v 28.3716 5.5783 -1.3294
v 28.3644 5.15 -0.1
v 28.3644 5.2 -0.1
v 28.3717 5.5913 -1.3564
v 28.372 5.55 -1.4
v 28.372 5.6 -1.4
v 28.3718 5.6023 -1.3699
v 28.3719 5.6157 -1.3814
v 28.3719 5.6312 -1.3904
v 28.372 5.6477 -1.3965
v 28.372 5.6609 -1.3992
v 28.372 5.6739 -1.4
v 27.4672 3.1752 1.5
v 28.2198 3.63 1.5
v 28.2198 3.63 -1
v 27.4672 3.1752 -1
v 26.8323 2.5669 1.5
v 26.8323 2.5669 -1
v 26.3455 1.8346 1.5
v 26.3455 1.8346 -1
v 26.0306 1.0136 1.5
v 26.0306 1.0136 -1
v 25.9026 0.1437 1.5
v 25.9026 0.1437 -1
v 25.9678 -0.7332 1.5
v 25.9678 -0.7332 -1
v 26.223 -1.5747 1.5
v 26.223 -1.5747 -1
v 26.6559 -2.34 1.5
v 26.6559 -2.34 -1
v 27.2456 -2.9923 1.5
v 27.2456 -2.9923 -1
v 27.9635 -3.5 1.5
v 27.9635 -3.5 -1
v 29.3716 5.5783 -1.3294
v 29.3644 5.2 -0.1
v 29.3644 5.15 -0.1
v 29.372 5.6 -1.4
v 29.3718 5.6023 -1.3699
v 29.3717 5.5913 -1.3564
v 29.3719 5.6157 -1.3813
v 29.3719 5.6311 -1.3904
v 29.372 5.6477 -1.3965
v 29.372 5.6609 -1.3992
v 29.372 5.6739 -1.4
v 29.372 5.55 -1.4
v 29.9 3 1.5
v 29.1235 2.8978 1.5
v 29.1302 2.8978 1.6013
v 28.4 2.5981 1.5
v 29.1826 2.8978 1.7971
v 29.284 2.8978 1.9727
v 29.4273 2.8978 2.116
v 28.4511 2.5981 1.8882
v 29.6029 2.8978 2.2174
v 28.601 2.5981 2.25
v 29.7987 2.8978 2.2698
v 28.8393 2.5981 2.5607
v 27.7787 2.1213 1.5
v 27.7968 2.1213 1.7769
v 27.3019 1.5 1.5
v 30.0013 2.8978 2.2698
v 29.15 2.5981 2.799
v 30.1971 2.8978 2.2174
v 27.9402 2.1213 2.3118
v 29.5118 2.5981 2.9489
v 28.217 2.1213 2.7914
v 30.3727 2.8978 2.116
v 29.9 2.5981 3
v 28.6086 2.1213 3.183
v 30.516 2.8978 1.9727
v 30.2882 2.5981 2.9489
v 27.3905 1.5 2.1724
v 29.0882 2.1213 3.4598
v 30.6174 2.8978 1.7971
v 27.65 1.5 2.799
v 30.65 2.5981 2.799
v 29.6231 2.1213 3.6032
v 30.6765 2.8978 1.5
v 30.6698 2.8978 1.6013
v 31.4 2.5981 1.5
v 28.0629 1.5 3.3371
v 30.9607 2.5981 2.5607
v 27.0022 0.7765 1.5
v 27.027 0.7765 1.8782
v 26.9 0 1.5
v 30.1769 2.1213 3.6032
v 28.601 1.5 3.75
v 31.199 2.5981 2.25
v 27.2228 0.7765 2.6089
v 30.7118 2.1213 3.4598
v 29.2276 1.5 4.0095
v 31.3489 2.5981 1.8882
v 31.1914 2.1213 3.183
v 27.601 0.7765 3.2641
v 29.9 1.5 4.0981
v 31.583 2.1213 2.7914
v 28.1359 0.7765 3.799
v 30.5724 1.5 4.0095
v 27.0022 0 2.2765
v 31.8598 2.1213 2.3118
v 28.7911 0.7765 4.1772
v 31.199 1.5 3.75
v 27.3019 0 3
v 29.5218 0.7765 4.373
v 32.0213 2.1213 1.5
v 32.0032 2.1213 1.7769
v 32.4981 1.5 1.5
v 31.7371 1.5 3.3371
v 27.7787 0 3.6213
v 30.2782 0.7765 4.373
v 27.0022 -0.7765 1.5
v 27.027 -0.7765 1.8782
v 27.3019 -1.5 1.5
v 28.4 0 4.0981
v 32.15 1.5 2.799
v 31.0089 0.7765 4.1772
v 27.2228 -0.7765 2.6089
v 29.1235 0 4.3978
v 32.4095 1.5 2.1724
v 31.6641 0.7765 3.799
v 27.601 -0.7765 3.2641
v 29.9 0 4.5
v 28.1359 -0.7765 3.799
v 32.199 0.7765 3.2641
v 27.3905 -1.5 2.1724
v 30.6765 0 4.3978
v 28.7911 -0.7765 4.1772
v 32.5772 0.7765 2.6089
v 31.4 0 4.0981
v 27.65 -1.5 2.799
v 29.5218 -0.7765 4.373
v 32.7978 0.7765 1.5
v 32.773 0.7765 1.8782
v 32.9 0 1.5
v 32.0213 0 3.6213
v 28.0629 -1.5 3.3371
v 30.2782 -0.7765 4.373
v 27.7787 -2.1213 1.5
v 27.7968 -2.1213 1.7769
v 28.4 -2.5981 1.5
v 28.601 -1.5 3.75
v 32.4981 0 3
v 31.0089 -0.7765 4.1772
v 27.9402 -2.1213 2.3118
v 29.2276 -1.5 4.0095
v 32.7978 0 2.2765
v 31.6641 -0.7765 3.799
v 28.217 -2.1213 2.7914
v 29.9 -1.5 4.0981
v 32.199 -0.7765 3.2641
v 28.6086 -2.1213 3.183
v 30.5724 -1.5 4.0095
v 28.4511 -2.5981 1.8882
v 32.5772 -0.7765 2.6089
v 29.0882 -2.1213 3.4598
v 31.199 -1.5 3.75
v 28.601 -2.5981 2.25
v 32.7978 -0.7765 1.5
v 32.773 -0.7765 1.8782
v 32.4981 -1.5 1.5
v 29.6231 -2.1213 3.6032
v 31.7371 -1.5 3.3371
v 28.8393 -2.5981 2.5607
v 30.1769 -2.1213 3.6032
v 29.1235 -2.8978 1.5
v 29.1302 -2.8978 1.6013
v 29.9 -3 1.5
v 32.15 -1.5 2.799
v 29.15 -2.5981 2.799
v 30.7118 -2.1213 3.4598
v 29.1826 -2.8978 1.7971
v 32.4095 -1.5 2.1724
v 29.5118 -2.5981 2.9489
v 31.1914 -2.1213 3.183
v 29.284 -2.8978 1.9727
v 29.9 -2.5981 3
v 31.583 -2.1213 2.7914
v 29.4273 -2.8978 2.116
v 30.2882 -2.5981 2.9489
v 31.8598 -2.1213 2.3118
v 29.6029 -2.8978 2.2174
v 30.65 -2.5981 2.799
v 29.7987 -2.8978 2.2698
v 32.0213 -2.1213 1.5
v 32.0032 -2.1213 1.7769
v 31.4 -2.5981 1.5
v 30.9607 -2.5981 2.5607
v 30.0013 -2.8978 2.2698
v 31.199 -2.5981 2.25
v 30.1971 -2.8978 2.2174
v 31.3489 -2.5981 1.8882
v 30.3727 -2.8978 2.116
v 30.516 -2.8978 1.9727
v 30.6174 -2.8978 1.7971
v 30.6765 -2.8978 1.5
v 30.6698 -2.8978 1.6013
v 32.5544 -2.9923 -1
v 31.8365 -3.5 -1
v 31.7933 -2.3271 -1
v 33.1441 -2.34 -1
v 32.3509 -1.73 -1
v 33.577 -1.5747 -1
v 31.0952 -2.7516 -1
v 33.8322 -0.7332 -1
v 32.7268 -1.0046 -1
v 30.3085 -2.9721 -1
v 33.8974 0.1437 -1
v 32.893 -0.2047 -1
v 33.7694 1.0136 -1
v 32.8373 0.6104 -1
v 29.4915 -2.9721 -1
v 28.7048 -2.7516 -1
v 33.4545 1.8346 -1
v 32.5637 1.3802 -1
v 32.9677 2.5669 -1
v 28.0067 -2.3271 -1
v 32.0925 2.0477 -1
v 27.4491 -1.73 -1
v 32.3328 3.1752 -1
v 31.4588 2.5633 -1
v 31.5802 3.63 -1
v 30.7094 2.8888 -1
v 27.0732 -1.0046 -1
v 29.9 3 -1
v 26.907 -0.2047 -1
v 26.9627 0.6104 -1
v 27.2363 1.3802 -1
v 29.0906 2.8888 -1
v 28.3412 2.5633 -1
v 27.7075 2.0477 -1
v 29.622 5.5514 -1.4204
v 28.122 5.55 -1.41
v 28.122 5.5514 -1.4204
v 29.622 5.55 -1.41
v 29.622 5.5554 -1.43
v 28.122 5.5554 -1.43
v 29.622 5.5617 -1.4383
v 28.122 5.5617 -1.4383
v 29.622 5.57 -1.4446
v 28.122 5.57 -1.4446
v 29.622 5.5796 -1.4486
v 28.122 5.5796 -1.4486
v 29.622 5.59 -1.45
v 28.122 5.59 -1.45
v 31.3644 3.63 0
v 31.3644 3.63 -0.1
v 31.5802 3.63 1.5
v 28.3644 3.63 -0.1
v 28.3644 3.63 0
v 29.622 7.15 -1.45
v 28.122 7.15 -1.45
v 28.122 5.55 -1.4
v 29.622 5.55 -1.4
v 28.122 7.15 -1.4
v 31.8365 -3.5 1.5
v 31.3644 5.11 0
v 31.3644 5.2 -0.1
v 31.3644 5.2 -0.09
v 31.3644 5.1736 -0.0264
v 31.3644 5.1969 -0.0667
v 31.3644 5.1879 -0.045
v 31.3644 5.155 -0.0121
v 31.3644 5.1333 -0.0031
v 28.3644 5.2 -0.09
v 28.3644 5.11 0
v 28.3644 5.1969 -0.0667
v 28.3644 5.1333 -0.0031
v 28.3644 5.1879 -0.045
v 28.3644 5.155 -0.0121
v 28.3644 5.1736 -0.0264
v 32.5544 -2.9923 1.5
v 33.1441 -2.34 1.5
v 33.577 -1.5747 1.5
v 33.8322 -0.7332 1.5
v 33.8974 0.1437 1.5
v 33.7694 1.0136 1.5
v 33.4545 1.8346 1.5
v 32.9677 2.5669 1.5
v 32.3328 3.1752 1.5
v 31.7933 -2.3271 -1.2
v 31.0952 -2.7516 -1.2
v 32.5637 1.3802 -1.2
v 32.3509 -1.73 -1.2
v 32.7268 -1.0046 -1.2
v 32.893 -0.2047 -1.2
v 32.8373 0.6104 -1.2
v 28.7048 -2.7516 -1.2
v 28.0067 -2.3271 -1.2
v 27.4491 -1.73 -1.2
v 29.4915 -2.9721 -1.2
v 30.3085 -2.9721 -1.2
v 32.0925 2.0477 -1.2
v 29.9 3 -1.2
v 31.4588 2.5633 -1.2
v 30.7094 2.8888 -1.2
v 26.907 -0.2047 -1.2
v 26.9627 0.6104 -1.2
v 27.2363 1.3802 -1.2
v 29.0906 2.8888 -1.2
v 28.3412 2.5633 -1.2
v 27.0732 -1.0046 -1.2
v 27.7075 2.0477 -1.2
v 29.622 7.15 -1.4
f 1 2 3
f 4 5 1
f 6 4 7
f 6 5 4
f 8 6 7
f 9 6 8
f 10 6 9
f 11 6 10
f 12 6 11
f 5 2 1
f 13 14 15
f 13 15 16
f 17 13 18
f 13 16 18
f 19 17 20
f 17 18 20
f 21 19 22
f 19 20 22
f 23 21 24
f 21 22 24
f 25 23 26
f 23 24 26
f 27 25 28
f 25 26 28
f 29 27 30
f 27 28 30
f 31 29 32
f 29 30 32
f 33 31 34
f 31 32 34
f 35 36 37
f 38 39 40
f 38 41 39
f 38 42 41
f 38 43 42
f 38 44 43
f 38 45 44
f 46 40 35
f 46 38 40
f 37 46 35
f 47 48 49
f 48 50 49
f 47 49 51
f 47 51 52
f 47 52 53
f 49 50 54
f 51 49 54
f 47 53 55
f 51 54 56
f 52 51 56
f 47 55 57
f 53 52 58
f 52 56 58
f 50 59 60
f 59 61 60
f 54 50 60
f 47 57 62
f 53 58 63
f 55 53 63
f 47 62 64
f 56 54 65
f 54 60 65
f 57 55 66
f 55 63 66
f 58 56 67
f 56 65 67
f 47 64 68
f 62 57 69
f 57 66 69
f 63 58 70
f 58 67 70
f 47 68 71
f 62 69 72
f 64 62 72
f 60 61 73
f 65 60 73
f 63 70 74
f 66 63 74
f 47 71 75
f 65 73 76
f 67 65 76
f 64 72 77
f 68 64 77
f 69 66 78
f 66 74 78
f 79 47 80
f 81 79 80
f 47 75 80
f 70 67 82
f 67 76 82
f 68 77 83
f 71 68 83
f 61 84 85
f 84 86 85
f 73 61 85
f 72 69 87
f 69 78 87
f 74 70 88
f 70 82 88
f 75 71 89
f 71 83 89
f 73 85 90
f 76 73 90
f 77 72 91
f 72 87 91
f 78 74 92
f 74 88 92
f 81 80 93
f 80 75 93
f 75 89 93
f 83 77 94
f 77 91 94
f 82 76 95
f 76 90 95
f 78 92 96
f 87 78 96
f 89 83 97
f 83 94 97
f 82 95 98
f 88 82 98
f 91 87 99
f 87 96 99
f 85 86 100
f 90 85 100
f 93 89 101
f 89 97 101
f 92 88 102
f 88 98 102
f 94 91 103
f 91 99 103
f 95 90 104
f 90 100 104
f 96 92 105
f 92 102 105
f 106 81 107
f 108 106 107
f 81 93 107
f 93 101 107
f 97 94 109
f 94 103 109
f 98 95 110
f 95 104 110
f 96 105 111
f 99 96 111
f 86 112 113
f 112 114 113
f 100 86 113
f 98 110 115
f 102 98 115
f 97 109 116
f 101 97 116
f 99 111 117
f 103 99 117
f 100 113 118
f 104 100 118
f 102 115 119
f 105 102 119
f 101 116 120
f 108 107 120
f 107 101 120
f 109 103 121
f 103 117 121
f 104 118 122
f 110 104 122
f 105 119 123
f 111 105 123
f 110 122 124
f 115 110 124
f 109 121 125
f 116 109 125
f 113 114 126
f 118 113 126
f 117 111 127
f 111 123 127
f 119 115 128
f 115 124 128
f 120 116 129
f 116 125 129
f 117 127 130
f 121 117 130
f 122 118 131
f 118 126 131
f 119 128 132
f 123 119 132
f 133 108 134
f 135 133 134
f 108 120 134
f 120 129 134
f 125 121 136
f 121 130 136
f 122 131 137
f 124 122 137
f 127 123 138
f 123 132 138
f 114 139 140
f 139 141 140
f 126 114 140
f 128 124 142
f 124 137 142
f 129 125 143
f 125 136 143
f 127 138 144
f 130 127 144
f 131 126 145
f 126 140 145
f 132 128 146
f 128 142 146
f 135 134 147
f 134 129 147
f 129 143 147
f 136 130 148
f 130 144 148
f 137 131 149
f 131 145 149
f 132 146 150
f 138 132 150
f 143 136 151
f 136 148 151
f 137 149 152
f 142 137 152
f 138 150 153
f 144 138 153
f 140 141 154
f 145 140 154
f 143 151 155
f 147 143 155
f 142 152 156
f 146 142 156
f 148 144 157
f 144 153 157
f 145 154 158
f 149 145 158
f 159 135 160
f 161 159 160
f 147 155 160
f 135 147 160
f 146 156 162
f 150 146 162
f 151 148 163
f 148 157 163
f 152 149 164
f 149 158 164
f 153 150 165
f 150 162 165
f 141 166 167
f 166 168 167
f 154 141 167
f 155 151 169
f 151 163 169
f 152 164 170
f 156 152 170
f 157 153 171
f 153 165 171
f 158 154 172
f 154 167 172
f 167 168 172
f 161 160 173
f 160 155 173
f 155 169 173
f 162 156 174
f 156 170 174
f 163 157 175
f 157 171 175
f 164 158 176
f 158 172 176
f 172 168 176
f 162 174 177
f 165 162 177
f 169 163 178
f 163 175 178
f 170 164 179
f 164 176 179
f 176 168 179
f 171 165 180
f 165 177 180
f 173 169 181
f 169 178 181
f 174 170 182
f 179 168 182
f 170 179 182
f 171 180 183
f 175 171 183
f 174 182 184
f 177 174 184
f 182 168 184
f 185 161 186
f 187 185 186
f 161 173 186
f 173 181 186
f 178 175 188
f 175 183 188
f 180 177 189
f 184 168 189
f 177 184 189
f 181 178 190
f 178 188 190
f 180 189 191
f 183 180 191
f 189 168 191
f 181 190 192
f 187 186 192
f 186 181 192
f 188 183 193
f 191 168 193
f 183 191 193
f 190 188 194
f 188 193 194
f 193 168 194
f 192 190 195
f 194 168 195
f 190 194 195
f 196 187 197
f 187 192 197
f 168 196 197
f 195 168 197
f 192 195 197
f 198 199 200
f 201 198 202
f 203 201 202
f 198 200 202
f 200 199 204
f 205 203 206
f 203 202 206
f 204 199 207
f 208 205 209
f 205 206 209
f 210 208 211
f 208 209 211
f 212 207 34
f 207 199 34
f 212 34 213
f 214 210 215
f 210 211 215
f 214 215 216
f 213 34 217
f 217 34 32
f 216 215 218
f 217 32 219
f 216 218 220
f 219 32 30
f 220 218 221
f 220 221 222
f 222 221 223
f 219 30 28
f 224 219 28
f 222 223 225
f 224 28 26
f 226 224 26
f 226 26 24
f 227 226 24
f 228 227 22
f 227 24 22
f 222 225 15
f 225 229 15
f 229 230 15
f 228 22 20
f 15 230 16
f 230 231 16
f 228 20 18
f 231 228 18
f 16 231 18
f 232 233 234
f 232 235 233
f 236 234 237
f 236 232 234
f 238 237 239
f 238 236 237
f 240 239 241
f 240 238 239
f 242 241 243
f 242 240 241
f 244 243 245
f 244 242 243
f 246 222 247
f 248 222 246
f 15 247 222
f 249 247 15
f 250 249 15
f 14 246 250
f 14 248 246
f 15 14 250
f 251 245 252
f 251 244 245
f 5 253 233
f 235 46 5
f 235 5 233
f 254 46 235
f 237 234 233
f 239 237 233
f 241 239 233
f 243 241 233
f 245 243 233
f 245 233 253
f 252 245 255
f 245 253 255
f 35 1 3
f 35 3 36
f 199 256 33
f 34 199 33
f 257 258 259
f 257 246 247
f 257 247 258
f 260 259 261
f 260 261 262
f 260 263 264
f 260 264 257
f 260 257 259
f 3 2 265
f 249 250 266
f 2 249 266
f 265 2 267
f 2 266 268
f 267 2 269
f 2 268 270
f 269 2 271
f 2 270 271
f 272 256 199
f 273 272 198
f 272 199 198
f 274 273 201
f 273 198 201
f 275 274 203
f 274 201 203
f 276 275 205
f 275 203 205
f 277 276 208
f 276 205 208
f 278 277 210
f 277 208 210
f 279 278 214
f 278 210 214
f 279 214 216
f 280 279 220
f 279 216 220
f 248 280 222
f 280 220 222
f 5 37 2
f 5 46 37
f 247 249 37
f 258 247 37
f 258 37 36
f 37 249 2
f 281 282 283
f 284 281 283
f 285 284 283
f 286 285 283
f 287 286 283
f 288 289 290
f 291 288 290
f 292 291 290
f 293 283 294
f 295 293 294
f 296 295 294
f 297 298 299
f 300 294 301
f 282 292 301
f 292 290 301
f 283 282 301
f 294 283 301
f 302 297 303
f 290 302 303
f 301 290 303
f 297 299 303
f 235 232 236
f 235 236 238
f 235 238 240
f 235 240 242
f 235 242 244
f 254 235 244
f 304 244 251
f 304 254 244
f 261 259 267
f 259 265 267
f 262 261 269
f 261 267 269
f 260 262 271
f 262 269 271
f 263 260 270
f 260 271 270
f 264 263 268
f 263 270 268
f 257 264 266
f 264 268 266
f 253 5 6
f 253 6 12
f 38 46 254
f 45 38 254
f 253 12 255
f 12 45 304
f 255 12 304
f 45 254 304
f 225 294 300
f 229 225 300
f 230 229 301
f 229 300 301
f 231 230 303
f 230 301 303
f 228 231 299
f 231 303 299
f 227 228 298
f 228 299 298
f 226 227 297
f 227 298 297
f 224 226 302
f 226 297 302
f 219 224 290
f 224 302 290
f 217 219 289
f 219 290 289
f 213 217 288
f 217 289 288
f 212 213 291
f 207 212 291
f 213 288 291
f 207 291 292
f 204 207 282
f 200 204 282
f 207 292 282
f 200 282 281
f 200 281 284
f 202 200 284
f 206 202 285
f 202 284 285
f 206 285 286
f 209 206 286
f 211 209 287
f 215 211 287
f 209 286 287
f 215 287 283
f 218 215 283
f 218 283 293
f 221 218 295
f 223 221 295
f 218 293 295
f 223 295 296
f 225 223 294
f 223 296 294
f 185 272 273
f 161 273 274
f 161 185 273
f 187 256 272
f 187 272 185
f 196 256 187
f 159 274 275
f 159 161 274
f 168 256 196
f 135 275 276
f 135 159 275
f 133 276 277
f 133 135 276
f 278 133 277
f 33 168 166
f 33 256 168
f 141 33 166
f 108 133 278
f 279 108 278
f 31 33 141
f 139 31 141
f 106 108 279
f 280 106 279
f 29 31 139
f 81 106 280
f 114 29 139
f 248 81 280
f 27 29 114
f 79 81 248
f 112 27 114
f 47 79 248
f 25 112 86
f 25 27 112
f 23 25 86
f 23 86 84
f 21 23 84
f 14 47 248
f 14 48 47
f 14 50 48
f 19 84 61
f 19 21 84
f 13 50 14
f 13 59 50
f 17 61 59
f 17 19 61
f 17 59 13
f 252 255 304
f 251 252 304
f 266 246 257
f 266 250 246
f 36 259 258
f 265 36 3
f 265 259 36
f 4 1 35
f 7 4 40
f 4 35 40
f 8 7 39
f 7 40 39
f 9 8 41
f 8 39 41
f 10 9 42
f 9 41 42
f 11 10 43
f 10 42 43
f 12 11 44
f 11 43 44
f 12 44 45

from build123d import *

# Parameters (mm, degrees)
SKETCH022_W             = 1.57
SKETCH022_H             = 3
PAD011_DEPTH            = 0.1
SKETCH024_W             = 0.05
SKETCH024_H             = 1
SKETCH025_W             = 0.05
SKETCH025_H             = 1
SKETCH026_W             = 1.6
SKETCH026_H             = 1.5
PAD012_DEPTH            = 0.05
FILLET004_R             = 0.09
FILLET005_R             = 0.1
FILLET006_R             = 0.04
REVOLUTION001_ANGLE     = 180
SKETCH028_R             = 3
PAD013_DEPTH            = 0.2
SKETCH020_R             = 4
PAD010_DEPTH            = 2.5
SKETCH023_W             = 2.920448
SKETCH023_H             = 7.916798
SKETCH023_W_2           = 3.050448
POCKET004_DEPTH         = 2.501
BODY010_PLACEMENT_ANGLE = 90


with BuildPart() as pad001:
    # Sketch022 → Pad011 (new body)
    with BuildSketch(Plane.XY):
        with Locations((4.415, 0.035576)):
            Rectangle(SKETCH022_W, SKETCH022_H)
    extrude(amount=-PAD011_DEPTH)

    # Sketch024 (on Face6 of Pad011) → AdditiveLoft002 section 0
    with BuildSketch(Plane(origin=(0, 0, -0.1), x_dir=(1, 0, 0), z_dir=(0, 0, -1))):
        with Locations((5.175, -1.035576)):
            Rectangle(SKETCH024_W, SKETCH024_H)
    # Sketch025 (on Face6 of Pad011) → AdditiveLoft002 section 1
    with BuildSketch(Plane(origin=(0, 0, -1.4), x_dir=(1, 0, 0), z_dir=(0, 0, -1))):
        with Locations((5.575, -1.028005)):
            Rectangle(SKETCH025_W, SKETCH025_H)
    loft()

    # Sketch026 (on Face11 of AdditiveLoft002) → Pad012 (join)
    with BuildSketch(Plane(origin=(0, 0, -1.4), x_dir=(1, 0, 0), z_dir=(0, 0, -1))):
        with Locations((6.35, -1.028005)):
            Rectangle(SKETCH026_W, SKETCH026_H)
    extrude(amount=PAD012_DEPTH)

    # Fillet004
    fillet004_edges = [pad001.edges().sort_by_distance(p)[0] for p in [
        (5.2, 0.035576, 0),
    ]]
    fillet(fillet004_edges, radius=FILLET004_R)

    # Fillet005
    fillet005_edges = [pad001.edges().sort_by_distance(p)[0] for p in [
        (5.6, 1.028005, -1.4),
    ]]
    fillet(fillet005_edges, radius=FILLET005_R)

    # Fillet006
    fillet006_edges = [pad001.edges().sort_by_distance(p)[0] for p in [
        (5.55, 1.028005, -1.45),
    ]]
    fillet(fillet006_edges, radius=FILLET006_R)


with BuildPart() as pad001_1:
    # Body008 placement: moved
    add(pad001.part.moved(Location((0, 0, 1))))


with BuildPart() as len001:
    # Sketch021 (on DatumPlane) → Revolution001 (revolve)
    with BuildSketch(Plane.XY.offset(2.5)):
        with BuildLine():
            Line((-3, 0), (3, 0))
            ThreePointArc((3, 0), (0, 3), (-3, 0))
        make_face()
    revolve(axis=Axis((0, 0, 2.5), (1, 0, 0)), revolution_arc=REVOLUTION001_ANGLE)


with BuildPart() as thermalpad001:
    # Sketch028 → Pad013 (new body)
    with BuildSketch(Plane.XY):
        Circle(SKETCH028_R)
    extrude(amount=PAD013_DEPTH)


with BuildPart() as thermalpad001_1:
    # Body009 placement: moved
    add(thermalpad001.part.moved(Location((0, 0, -0.2))))


with BuildPart() as led2:
    # Sketch020 → Pad010 (new body)
    with BuildSketch(Plane.XY):
        Circle(SKETCH020_R)
    extrude(amount=PAD010_DEPTH)

    # Sketch023 (on Face3 of Pad010) → Pocket004 (cut, through all)
    with BuildSketch(Plane.XY.offset(2.5)):
        with Locations((5.090224, -0.060281)):
            Rectangle(SKETCH023_W, SKETCH023_H)
        with Locations((-5.025224, 0.060281)):
            Rectangle(SKETCH023_W_2, SKETCH023_H)
    extrude(amount=-POCKET004_DEPTH, mode=Mode.SUBTRACT)

    # Fusion001: union PAD001, Len001, ThermalPad001
    add(pad001_1.part)
    add(len001.part)
    add(thermalpad001_1.part)


with BuildPart() as led2_1:
    # Fusion001 placement: moved
    add(led2.part.moved(Location((9.2, 28.5, -1))))


with BuildPart() as led2_2:
    # Body010 placement: moved
    add(led2_1.part.moved(Location((58.4, -9.2, 0))).rotate(Axis((58.4, -9.2, 0), (0, 0, 1)), BODY010_PLACEMENT_ANGLE))


solid = led2_2.part
